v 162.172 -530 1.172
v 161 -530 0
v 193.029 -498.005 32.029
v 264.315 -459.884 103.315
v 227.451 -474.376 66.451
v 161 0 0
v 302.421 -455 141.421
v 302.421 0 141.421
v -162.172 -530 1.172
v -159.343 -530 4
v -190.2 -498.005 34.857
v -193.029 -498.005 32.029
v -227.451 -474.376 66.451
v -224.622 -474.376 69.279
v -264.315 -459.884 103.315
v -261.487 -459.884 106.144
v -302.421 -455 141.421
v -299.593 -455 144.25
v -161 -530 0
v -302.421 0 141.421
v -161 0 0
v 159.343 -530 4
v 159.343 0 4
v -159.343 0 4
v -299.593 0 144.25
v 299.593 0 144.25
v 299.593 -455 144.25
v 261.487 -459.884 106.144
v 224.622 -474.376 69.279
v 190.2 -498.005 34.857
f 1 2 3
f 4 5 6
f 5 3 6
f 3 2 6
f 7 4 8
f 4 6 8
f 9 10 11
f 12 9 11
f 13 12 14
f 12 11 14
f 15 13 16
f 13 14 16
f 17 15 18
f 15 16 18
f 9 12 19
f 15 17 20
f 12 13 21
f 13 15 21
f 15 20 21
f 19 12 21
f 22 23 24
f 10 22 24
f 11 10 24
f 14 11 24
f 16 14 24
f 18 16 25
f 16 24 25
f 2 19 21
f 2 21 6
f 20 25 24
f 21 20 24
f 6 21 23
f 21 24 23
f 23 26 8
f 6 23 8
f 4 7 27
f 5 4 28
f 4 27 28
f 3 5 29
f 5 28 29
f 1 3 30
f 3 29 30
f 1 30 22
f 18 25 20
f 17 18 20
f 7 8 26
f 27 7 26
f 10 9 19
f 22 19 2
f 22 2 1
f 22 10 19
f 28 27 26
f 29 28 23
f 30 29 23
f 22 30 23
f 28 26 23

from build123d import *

# Parameters (mm, degrees)
F1_DEPTH = 480
F3_DEPTH = 50
F5_DEPTH = 25
F7_DEPTH = 25


with BuildPart() as f1:
    # F0 (on Front) → F1 (new body)
    with BuildSketch(Plane.XZ):
        Polygon((-161, 0), (0, 0), (161, 0), (302.421356, 141.421356), (299.592929, 144.249783), (159.343146, 4), (0, 4), (-159.343146, 4), (-299.592929, 144.249783), (-302.421356, 141.421356), align=None)
    extrude(amount=F1_DEPTH)

    # F2 (on face) → F3 (join)
    with BuildSketch(Plane.XZ.offset(480)):
        Polygon((-299.592929, 144.249783), (-302.421356, 141.421356), (-161, 0), (161, 0), (302.421356, 141.421356), (299.592929, 144.249783), (159.343146, 4), (-159.343146, 4), align=None)
    extrude(amount=F3_DEPTH)

    # F4 (on face) → F5 (cut)
    with BuildSketch(Plane(origin=(-77.671573, 0, -77.671573), x_dir=(0, 1, 0), z_dir=(0.707107, 0, 0.707107))):
        with BuildLine():
            Line((-754.76669, 313.844192), (-530, 115.501046))
            ThreePointArc((-530, 115.501046), (-474.376217, 207.819426), (-455, 313.844192))
            Line((-455, 313.844192), (-754.76669, 313.844192))
        make_face()
    extrude(amount=-F5_DEPTH, mode=Mode.SUBTRACT)

    # F6 (on face) → F7 (cut)
    with BuildSketch(Plane(origin=(77.671573, 0, -77.671573), x_dir=(0, -1, 0), z_dir=(-0.707107, 0, 0.707107))):
        with BuildLine():
            Line((754.76669, 313.844192), (455, 313.844192))
            ThreePointArc((455, 313.844192), (474.376217, 207.819426), (530, 115.501046))
            Line((530, 115.501046), (754.76669, 313.844192))
        make_face()
    extrude(amount=-F7_DEPTH, mode=Mode.SUBTRACT)


solid = f1.part
